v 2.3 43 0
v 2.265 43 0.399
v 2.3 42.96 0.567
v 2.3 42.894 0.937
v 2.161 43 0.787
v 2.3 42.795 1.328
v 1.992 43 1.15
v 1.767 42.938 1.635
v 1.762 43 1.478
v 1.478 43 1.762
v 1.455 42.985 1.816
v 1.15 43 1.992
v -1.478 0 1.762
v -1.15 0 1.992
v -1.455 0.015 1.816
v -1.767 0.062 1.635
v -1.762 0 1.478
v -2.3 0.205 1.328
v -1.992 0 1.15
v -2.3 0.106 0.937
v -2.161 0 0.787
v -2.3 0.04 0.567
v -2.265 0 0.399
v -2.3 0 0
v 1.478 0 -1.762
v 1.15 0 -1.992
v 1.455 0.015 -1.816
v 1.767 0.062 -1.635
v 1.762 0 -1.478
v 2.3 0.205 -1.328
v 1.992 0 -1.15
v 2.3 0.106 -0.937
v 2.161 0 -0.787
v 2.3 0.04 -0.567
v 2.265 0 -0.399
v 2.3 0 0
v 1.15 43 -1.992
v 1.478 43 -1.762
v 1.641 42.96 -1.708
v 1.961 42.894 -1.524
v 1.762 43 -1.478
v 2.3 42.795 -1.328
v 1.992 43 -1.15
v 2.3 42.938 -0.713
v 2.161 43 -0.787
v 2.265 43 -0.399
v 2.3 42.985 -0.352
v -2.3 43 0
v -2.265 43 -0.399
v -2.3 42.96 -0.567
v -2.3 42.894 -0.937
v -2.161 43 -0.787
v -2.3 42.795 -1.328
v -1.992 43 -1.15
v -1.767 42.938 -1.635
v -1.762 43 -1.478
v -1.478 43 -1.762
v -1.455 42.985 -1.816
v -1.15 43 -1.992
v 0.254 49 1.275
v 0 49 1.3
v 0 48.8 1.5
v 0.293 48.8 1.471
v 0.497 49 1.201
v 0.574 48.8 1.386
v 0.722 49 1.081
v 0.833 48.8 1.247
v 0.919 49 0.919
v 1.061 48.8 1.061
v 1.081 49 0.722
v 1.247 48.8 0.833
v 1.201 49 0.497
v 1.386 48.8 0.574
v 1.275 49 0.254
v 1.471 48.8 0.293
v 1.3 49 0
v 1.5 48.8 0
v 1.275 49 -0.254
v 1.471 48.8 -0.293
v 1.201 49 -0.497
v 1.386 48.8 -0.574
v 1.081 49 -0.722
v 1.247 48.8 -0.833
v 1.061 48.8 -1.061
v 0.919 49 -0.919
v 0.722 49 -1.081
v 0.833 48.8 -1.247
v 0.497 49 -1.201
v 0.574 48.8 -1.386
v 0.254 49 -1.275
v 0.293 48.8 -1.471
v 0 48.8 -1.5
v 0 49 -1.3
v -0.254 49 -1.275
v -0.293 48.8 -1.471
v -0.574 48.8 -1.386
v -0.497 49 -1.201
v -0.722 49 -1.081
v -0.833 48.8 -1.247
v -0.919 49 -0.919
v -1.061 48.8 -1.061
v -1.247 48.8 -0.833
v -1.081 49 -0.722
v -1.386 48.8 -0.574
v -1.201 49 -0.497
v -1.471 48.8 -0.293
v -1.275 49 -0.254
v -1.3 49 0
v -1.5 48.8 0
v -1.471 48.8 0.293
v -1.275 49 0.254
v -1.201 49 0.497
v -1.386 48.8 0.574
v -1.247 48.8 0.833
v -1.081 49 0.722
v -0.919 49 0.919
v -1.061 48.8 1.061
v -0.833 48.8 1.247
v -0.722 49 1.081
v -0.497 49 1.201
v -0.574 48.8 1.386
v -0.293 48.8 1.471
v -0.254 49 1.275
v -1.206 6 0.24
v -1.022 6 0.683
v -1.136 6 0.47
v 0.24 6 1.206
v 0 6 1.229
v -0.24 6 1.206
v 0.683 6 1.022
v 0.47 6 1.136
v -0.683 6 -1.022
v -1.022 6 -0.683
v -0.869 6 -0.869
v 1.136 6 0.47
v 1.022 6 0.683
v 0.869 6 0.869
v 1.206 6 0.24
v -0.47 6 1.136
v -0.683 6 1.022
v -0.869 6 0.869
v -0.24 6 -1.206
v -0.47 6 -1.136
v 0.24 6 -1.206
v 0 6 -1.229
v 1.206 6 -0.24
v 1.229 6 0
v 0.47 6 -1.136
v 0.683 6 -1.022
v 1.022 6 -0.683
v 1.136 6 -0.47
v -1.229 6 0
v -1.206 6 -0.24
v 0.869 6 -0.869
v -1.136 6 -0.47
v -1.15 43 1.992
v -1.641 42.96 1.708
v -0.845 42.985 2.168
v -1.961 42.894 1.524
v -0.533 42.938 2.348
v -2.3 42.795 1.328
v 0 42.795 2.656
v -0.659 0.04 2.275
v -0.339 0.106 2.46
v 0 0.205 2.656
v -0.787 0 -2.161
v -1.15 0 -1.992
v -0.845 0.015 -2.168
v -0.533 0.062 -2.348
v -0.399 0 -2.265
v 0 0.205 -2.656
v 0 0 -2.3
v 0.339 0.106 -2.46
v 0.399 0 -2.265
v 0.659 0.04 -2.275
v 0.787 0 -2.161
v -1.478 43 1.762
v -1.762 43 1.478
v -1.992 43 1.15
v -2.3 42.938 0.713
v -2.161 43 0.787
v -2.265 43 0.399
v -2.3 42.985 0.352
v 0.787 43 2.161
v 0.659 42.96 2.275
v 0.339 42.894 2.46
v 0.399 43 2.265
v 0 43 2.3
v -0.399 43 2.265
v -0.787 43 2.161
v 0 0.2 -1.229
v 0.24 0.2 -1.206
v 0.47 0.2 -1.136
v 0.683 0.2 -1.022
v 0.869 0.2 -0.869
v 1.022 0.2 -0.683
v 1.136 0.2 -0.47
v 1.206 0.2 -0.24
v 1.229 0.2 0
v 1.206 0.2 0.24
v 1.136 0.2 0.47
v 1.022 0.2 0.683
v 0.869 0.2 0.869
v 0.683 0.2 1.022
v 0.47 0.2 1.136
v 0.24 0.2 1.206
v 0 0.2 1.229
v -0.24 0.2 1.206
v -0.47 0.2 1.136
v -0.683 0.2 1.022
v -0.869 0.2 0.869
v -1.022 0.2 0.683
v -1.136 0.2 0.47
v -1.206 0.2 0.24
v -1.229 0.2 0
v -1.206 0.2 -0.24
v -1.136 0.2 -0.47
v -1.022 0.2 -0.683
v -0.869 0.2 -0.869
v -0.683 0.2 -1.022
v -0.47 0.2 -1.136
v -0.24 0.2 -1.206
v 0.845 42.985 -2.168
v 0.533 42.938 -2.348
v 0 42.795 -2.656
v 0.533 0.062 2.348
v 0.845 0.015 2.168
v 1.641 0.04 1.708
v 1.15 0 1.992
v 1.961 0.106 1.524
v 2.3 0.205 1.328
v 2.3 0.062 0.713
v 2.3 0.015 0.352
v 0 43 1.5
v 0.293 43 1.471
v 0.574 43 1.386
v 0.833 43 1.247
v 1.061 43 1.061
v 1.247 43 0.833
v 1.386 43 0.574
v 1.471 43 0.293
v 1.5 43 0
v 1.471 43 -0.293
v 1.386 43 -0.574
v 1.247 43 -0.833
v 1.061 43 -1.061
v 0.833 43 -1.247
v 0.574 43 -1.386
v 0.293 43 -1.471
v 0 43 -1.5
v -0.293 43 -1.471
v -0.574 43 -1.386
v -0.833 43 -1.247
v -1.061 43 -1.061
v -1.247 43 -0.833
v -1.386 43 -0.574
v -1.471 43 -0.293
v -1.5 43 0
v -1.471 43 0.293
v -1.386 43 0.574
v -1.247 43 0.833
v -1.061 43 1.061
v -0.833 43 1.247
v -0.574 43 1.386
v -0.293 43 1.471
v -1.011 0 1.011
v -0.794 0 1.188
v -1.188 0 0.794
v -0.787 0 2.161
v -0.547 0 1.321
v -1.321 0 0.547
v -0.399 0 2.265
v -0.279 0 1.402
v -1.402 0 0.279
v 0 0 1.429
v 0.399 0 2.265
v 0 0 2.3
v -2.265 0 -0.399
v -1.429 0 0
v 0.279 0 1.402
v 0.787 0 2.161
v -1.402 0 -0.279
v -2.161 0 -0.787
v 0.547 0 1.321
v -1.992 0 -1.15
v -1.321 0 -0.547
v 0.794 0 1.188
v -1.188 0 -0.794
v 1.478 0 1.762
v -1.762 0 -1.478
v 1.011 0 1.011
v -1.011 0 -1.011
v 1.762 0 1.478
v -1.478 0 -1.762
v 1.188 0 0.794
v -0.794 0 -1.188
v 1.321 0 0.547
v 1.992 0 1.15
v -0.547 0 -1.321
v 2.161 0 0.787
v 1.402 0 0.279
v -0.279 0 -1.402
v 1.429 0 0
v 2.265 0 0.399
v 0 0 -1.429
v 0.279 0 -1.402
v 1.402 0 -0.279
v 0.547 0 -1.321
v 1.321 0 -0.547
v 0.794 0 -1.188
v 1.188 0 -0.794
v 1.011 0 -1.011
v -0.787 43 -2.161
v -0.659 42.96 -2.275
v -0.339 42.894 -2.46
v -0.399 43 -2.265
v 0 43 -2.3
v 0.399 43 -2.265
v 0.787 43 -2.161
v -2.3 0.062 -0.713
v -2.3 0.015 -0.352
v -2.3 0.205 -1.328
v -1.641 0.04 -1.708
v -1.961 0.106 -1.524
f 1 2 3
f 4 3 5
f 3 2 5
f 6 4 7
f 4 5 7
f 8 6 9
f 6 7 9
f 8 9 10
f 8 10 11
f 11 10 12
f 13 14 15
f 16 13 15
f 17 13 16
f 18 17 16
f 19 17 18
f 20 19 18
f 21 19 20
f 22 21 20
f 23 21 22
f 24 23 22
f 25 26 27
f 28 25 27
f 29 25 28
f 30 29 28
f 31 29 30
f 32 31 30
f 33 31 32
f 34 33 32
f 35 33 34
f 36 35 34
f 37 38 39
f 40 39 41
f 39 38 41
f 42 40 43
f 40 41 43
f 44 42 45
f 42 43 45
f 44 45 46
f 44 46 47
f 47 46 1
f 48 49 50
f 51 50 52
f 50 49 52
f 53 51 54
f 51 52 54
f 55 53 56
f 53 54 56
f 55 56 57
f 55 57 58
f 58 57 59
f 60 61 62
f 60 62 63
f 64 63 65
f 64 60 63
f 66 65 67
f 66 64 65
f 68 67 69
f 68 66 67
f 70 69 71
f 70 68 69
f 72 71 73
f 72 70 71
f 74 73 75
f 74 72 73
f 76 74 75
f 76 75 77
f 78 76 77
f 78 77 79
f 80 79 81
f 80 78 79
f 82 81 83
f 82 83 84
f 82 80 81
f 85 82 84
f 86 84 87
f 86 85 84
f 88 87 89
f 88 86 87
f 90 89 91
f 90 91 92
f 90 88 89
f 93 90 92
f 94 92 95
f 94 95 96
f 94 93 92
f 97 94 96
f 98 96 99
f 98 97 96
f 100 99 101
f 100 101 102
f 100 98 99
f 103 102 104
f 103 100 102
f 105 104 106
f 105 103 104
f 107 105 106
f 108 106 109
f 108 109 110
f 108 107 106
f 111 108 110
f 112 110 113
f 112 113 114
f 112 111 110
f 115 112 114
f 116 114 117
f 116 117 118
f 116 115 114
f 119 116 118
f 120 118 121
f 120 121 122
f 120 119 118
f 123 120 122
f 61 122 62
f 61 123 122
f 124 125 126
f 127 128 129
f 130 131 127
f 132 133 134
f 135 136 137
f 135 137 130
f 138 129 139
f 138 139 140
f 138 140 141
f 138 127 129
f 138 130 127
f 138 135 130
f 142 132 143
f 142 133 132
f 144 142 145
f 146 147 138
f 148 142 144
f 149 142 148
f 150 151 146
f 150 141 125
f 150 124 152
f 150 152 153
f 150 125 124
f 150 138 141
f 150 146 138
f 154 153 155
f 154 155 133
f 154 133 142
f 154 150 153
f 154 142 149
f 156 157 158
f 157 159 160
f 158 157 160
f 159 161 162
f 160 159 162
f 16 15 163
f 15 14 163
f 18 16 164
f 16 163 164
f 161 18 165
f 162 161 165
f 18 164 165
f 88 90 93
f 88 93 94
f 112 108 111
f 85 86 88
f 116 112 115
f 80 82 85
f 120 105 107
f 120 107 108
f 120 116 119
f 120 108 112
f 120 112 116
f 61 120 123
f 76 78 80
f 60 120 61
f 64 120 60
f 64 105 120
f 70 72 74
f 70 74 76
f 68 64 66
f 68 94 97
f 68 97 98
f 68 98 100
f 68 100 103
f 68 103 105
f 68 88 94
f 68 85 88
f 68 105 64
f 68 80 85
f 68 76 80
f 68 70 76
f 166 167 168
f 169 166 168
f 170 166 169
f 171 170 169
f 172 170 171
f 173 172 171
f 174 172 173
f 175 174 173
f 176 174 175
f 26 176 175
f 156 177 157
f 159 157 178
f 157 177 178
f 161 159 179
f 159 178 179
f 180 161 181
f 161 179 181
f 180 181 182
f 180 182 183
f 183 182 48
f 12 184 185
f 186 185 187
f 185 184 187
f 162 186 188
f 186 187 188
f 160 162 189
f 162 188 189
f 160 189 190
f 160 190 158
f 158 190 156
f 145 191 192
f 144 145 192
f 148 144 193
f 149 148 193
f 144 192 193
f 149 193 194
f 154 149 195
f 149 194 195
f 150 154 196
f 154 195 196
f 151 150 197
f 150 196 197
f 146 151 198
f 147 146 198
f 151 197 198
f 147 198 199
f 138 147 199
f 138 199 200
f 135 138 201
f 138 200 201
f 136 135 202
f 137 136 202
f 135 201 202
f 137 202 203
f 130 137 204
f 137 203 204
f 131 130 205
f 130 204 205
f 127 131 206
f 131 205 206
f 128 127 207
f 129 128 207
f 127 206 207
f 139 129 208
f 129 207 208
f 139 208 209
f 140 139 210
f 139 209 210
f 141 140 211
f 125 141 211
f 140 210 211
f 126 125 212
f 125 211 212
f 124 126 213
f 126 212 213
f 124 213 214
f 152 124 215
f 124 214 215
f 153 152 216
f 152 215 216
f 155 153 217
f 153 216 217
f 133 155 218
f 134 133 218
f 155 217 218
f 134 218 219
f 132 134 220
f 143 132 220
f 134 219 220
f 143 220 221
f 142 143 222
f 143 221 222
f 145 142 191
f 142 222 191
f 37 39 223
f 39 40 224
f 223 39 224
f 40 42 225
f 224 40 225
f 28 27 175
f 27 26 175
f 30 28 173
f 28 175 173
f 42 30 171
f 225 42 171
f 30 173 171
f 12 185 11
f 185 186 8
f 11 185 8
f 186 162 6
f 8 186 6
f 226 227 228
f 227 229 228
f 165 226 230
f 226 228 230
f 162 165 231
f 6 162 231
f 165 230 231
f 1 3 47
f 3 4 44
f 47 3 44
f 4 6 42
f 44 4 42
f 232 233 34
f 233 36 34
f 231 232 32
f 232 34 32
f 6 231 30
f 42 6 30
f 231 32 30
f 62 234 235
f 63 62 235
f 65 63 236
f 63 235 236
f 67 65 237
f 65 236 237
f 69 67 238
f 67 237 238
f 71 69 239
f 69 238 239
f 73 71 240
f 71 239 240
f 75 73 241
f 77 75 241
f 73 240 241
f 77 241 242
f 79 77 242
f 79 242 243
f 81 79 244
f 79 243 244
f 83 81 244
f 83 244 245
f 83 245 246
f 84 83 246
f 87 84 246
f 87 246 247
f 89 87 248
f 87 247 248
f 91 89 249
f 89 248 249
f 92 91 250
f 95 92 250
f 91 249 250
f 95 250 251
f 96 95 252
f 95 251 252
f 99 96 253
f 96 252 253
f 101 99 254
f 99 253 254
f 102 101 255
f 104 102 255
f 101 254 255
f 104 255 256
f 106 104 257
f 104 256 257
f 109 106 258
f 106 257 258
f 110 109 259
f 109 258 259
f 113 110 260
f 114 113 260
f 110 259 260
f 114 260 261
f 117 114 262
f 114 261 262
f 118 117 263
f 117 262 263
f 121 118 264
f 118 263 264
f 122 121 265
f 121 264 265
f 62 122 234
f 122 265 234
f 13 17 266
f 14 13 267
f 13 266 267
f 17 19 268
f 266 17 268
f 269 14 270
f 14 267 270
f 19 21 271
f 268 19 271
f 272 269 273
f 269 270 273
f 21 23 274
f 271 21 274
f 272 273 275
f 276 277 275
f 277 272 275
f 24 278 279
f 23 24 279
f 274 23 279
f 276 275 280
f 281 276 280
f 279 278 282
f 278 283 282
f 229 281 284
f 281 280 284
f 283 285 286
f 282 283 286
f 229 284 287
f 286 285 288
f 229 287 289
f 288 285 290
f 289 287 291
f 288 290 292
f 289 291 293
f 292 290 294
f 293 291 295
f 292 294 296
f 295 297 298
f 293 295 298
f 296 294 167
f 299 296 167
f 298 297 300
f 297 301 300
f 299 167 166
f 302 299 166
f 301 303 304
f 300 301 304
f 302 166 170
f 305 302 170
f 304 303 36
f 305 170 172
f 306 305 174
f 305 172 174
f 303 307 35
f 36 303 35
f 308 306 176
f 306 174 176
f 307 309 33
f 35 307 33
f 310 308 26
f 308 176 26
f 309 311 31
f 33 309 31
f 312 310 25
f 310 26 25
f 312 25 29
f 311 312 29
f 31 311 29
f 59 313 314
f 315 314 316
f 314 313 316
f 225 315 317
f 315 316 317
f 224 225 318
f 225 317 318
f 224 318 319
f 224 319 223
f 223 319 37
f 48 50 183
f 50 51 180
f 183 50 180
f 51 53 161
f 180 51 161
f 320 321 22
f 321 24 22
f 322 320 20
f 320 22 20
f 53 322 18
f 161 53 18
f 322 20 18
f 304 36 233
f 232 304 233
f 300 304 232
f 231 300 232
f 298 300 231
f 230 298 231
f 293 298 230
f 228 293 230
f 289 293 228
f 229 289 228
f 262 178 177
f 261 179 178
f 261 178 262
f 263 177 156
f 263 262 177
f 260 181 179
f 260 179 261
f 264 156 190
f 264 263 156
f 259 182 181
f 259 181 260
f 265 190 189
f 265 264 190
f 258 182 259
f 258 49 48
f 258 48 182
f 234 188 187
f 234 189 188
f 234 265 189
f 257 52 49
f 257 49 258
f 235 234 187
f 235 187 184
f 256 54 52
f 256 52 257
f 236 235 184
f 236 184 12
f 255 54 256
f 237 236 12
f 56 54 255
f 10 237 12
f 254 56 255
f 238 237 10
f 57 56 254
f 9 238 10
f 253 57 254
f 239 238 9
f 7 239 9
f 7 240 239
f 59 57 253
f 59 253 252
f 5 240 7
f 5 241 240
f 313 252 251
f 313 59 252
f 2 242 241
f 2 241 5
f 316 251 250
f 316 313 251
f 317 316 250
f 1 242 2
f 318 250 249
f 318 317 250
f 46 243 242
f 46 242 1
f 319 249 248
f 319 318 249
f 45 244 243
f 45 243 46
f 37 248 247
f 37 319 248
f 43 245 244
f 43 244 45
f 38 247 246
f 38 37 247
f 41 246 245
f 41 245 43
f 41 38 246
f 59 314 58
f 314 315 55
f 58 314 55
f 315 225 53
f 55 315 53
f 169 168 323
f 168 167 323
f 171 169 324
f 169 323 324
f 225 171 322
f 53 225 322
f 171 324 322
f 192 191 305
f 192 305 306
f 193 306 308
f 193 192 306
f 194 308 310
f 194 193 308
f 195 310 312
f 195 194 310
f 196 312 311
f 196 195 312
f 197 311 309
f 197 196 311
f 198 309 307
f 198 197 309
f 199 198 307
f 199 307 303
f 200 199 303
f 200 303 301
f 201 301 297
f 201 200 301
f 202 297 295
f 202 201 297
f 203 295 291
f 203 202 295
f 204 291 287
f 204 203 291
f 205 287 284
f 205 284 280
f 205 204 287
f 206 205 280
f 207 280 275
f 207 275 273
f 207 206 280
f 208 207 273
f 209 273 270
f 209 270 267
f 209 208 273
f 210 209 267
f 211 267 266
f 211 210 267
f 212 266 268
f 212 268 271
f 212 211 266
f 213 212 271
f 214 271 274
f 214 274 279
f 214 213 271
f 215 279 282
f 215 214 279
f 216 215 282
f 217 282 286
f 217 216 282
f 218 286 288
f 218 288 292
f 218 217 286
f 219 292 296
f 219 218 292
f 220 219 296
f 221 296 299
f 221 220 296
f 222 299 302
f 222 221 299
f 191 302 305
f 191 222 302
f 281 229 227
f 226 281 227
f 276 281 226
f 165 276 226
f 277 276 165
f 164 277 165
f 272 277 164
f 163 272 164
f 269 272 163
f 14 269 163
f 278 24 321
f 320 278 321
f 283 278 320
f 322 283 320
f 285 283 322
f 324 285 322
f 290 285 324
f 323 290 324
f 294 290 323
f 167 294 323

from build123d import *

# Parameters (mm, degrees)
EXTRUDE_1_DEPTH      = 43
SKETCH_2_R           = 1.5
EXTRUDE_2_DEPTH      = 6
CHAMFER_1_SIZE       = 0.2
SKETCH_3_R           = 1.229375
CUT_EXTRUDE_1_DEPTH  = 6
SKETCH_4_OUTSIDE_W   = 26.892
SKETCH_4_OUTSIDE_H   = 27.604
SKETCH_4_OUTSIDE_R   = 2.3
CUT_EXTRUDE_2_DEPTH  = 3
CUT_EXTRUDE_2_DRAFT  = -60
CUT_EXTRUDE_START    = -43
SKETCH_4_2_OUTSIDE_W = 26.892
SKETCH_4_2_OUTSIDE_H = 27.604
SKETCH_4_2_OUTSIDE_R = 2.3
CUT_EXTRUDE_3_DEPTH  = 3
CUT_EXTRUDE_3_DRAFT  = 60
CHAMFER_2_SIZE       = 0.2


with BuildPart() as part:
    # 草图1 → 凸台-拉伸1 (new body)
    with BuildSketch(Plane(origin=(0, 0, 0), x_dir=(1, 0, 0), z_dir=(0, 1, 0))):
        Polygon((0, 2.655811238), (-2.3, 1.327905619), (-2.3, -1.327905619), (0, -2.655811238), (2.3, -1.327905619), (2.3, 1.327905619), align=None)
    extrude(amount=EXTRUDE_1_DEPTH)

    # 草图2 → 凸台-拉伸2 (add)
    with BuildSketch(Plane(origin=(0, 43, 0), x_dir=(1, 0, 0), z_dir=(0, 1, 0))):
        with Locations(Location((0, 0, 0), (0, 0, 270))):
            Circle(SKETCH_2_R)
    extrude(amount=EXTRUDE_2_DEPTH)

    # 倒角1
    chamfer_1_edges = [part.edges().sort_by_distance(p)[0] for p in [
        (0, 49, -1.5),
    ]]
    chamfer(chamfer_1_edges, length=CHAMFER_1_SIZE)

    # 草图3 → 切除-拉伸1 (cut)
    with BuildSketch(Plane.XZ):
        with Locations(Location((0, 0, 0), (0, 0, 270))):
            Circle(SKETCH_3_R)
    extrude(amount=-CUT_EXTRUDE_1_DEPTH, mode=Mode.SUBTRACT)


with BuildPart() as cut_extrude_2_tool:
    # 草图4 outside → 切除-拉伸2 (with draft: the straight prism first)
    with BuildSketch(Plane.XZ):
        Rectangle(SKETCH_4_OUTSIDE_W, SKETCH_4_OUTSIDE_H)
        Circle(SKETCH_4_OUTSIDE_R, mode=Mode.SUBTRACT)
    extrude(amount=-CUT_EXTRUDE_2_DEPTH)
    # 切除-拉伸2: the draft: its side faces are tilted about the plane it starts from
    cut_extrude_2_sides = [cut_extrude_2_tool.faces().sort_by_distance(p)[0] for p in [
        (0, 1.5, -13.802),
        (13.446, 1.5, 0),
        (0, 1.5, 13.802),
        (-13.446, 1.5, 0),
        (-2.3, 1.5, 0),
    ]]
    draft(cut_extrude_2_sides, Plane.XZ, CUT_EXTRUDE_2_DRAFT)


with BuildPart() as part_1:
    add(part.part)

    # 切除-拉伸2: cut by cut_extrude_2_tool
    add(cut_extrude_2_tool.part, mode=Mode.SUBTRACT)


with BuildPart() as cut_extrude_3_tool:
    # 草图4<2> outside → 切除-拉伸3 (with draft: the straight prism first)
    with BuildSketch(Plane.XZ.offset(CUT_EXTRUDE_START)):
        Rectangle(SKETCH_4_2_OUTSIDE_W, SKETCH_4_2_OUTSIDE_H)
        Circle(SKETCH_4_2_OUTSIDE_R, mode=Mode.SUBTRACT)
    extrude(amount=CUT_EXTRUDE_3_DEPTH)
    # 切除-拉伸3: the draft: its side faces are tilted about the plane it starts from
    cut_extrude_3_sides = [cut_extrude_3_tool.faces().sort_by_distance(p)[0] for p in [
        (0, 41.5, -13.802),
        (13.446, 41.5, 0),
        (0, 41.5, 13.802),
        (-13.446, 41.5, 0),
        (-2.3, 41.5, 0),
    ]]
    draft(cut_extrude_3_sides, Plane.XZ.offset(CUT_EXTRUDE_START), CUT_EXTRUDE_3_DRAFT)


with BuildPart() as part_2:
    add(part_1.part)

    # 切除-拉伸3: cut by cut_extrude_3_tool
    add(cut_extrude_3_tool.part, mode=Mode.SUBTRACT)

    # 倒角2
    chamfer_2_edges = [part_2.edges().sort_by_distance(p)[0] for p in [
        (0, 0, 1.229375),
    ]]
    chamfer(chamfer_2_edges, length=CHAMFER_2_SIZE)


solid = part_2.part
